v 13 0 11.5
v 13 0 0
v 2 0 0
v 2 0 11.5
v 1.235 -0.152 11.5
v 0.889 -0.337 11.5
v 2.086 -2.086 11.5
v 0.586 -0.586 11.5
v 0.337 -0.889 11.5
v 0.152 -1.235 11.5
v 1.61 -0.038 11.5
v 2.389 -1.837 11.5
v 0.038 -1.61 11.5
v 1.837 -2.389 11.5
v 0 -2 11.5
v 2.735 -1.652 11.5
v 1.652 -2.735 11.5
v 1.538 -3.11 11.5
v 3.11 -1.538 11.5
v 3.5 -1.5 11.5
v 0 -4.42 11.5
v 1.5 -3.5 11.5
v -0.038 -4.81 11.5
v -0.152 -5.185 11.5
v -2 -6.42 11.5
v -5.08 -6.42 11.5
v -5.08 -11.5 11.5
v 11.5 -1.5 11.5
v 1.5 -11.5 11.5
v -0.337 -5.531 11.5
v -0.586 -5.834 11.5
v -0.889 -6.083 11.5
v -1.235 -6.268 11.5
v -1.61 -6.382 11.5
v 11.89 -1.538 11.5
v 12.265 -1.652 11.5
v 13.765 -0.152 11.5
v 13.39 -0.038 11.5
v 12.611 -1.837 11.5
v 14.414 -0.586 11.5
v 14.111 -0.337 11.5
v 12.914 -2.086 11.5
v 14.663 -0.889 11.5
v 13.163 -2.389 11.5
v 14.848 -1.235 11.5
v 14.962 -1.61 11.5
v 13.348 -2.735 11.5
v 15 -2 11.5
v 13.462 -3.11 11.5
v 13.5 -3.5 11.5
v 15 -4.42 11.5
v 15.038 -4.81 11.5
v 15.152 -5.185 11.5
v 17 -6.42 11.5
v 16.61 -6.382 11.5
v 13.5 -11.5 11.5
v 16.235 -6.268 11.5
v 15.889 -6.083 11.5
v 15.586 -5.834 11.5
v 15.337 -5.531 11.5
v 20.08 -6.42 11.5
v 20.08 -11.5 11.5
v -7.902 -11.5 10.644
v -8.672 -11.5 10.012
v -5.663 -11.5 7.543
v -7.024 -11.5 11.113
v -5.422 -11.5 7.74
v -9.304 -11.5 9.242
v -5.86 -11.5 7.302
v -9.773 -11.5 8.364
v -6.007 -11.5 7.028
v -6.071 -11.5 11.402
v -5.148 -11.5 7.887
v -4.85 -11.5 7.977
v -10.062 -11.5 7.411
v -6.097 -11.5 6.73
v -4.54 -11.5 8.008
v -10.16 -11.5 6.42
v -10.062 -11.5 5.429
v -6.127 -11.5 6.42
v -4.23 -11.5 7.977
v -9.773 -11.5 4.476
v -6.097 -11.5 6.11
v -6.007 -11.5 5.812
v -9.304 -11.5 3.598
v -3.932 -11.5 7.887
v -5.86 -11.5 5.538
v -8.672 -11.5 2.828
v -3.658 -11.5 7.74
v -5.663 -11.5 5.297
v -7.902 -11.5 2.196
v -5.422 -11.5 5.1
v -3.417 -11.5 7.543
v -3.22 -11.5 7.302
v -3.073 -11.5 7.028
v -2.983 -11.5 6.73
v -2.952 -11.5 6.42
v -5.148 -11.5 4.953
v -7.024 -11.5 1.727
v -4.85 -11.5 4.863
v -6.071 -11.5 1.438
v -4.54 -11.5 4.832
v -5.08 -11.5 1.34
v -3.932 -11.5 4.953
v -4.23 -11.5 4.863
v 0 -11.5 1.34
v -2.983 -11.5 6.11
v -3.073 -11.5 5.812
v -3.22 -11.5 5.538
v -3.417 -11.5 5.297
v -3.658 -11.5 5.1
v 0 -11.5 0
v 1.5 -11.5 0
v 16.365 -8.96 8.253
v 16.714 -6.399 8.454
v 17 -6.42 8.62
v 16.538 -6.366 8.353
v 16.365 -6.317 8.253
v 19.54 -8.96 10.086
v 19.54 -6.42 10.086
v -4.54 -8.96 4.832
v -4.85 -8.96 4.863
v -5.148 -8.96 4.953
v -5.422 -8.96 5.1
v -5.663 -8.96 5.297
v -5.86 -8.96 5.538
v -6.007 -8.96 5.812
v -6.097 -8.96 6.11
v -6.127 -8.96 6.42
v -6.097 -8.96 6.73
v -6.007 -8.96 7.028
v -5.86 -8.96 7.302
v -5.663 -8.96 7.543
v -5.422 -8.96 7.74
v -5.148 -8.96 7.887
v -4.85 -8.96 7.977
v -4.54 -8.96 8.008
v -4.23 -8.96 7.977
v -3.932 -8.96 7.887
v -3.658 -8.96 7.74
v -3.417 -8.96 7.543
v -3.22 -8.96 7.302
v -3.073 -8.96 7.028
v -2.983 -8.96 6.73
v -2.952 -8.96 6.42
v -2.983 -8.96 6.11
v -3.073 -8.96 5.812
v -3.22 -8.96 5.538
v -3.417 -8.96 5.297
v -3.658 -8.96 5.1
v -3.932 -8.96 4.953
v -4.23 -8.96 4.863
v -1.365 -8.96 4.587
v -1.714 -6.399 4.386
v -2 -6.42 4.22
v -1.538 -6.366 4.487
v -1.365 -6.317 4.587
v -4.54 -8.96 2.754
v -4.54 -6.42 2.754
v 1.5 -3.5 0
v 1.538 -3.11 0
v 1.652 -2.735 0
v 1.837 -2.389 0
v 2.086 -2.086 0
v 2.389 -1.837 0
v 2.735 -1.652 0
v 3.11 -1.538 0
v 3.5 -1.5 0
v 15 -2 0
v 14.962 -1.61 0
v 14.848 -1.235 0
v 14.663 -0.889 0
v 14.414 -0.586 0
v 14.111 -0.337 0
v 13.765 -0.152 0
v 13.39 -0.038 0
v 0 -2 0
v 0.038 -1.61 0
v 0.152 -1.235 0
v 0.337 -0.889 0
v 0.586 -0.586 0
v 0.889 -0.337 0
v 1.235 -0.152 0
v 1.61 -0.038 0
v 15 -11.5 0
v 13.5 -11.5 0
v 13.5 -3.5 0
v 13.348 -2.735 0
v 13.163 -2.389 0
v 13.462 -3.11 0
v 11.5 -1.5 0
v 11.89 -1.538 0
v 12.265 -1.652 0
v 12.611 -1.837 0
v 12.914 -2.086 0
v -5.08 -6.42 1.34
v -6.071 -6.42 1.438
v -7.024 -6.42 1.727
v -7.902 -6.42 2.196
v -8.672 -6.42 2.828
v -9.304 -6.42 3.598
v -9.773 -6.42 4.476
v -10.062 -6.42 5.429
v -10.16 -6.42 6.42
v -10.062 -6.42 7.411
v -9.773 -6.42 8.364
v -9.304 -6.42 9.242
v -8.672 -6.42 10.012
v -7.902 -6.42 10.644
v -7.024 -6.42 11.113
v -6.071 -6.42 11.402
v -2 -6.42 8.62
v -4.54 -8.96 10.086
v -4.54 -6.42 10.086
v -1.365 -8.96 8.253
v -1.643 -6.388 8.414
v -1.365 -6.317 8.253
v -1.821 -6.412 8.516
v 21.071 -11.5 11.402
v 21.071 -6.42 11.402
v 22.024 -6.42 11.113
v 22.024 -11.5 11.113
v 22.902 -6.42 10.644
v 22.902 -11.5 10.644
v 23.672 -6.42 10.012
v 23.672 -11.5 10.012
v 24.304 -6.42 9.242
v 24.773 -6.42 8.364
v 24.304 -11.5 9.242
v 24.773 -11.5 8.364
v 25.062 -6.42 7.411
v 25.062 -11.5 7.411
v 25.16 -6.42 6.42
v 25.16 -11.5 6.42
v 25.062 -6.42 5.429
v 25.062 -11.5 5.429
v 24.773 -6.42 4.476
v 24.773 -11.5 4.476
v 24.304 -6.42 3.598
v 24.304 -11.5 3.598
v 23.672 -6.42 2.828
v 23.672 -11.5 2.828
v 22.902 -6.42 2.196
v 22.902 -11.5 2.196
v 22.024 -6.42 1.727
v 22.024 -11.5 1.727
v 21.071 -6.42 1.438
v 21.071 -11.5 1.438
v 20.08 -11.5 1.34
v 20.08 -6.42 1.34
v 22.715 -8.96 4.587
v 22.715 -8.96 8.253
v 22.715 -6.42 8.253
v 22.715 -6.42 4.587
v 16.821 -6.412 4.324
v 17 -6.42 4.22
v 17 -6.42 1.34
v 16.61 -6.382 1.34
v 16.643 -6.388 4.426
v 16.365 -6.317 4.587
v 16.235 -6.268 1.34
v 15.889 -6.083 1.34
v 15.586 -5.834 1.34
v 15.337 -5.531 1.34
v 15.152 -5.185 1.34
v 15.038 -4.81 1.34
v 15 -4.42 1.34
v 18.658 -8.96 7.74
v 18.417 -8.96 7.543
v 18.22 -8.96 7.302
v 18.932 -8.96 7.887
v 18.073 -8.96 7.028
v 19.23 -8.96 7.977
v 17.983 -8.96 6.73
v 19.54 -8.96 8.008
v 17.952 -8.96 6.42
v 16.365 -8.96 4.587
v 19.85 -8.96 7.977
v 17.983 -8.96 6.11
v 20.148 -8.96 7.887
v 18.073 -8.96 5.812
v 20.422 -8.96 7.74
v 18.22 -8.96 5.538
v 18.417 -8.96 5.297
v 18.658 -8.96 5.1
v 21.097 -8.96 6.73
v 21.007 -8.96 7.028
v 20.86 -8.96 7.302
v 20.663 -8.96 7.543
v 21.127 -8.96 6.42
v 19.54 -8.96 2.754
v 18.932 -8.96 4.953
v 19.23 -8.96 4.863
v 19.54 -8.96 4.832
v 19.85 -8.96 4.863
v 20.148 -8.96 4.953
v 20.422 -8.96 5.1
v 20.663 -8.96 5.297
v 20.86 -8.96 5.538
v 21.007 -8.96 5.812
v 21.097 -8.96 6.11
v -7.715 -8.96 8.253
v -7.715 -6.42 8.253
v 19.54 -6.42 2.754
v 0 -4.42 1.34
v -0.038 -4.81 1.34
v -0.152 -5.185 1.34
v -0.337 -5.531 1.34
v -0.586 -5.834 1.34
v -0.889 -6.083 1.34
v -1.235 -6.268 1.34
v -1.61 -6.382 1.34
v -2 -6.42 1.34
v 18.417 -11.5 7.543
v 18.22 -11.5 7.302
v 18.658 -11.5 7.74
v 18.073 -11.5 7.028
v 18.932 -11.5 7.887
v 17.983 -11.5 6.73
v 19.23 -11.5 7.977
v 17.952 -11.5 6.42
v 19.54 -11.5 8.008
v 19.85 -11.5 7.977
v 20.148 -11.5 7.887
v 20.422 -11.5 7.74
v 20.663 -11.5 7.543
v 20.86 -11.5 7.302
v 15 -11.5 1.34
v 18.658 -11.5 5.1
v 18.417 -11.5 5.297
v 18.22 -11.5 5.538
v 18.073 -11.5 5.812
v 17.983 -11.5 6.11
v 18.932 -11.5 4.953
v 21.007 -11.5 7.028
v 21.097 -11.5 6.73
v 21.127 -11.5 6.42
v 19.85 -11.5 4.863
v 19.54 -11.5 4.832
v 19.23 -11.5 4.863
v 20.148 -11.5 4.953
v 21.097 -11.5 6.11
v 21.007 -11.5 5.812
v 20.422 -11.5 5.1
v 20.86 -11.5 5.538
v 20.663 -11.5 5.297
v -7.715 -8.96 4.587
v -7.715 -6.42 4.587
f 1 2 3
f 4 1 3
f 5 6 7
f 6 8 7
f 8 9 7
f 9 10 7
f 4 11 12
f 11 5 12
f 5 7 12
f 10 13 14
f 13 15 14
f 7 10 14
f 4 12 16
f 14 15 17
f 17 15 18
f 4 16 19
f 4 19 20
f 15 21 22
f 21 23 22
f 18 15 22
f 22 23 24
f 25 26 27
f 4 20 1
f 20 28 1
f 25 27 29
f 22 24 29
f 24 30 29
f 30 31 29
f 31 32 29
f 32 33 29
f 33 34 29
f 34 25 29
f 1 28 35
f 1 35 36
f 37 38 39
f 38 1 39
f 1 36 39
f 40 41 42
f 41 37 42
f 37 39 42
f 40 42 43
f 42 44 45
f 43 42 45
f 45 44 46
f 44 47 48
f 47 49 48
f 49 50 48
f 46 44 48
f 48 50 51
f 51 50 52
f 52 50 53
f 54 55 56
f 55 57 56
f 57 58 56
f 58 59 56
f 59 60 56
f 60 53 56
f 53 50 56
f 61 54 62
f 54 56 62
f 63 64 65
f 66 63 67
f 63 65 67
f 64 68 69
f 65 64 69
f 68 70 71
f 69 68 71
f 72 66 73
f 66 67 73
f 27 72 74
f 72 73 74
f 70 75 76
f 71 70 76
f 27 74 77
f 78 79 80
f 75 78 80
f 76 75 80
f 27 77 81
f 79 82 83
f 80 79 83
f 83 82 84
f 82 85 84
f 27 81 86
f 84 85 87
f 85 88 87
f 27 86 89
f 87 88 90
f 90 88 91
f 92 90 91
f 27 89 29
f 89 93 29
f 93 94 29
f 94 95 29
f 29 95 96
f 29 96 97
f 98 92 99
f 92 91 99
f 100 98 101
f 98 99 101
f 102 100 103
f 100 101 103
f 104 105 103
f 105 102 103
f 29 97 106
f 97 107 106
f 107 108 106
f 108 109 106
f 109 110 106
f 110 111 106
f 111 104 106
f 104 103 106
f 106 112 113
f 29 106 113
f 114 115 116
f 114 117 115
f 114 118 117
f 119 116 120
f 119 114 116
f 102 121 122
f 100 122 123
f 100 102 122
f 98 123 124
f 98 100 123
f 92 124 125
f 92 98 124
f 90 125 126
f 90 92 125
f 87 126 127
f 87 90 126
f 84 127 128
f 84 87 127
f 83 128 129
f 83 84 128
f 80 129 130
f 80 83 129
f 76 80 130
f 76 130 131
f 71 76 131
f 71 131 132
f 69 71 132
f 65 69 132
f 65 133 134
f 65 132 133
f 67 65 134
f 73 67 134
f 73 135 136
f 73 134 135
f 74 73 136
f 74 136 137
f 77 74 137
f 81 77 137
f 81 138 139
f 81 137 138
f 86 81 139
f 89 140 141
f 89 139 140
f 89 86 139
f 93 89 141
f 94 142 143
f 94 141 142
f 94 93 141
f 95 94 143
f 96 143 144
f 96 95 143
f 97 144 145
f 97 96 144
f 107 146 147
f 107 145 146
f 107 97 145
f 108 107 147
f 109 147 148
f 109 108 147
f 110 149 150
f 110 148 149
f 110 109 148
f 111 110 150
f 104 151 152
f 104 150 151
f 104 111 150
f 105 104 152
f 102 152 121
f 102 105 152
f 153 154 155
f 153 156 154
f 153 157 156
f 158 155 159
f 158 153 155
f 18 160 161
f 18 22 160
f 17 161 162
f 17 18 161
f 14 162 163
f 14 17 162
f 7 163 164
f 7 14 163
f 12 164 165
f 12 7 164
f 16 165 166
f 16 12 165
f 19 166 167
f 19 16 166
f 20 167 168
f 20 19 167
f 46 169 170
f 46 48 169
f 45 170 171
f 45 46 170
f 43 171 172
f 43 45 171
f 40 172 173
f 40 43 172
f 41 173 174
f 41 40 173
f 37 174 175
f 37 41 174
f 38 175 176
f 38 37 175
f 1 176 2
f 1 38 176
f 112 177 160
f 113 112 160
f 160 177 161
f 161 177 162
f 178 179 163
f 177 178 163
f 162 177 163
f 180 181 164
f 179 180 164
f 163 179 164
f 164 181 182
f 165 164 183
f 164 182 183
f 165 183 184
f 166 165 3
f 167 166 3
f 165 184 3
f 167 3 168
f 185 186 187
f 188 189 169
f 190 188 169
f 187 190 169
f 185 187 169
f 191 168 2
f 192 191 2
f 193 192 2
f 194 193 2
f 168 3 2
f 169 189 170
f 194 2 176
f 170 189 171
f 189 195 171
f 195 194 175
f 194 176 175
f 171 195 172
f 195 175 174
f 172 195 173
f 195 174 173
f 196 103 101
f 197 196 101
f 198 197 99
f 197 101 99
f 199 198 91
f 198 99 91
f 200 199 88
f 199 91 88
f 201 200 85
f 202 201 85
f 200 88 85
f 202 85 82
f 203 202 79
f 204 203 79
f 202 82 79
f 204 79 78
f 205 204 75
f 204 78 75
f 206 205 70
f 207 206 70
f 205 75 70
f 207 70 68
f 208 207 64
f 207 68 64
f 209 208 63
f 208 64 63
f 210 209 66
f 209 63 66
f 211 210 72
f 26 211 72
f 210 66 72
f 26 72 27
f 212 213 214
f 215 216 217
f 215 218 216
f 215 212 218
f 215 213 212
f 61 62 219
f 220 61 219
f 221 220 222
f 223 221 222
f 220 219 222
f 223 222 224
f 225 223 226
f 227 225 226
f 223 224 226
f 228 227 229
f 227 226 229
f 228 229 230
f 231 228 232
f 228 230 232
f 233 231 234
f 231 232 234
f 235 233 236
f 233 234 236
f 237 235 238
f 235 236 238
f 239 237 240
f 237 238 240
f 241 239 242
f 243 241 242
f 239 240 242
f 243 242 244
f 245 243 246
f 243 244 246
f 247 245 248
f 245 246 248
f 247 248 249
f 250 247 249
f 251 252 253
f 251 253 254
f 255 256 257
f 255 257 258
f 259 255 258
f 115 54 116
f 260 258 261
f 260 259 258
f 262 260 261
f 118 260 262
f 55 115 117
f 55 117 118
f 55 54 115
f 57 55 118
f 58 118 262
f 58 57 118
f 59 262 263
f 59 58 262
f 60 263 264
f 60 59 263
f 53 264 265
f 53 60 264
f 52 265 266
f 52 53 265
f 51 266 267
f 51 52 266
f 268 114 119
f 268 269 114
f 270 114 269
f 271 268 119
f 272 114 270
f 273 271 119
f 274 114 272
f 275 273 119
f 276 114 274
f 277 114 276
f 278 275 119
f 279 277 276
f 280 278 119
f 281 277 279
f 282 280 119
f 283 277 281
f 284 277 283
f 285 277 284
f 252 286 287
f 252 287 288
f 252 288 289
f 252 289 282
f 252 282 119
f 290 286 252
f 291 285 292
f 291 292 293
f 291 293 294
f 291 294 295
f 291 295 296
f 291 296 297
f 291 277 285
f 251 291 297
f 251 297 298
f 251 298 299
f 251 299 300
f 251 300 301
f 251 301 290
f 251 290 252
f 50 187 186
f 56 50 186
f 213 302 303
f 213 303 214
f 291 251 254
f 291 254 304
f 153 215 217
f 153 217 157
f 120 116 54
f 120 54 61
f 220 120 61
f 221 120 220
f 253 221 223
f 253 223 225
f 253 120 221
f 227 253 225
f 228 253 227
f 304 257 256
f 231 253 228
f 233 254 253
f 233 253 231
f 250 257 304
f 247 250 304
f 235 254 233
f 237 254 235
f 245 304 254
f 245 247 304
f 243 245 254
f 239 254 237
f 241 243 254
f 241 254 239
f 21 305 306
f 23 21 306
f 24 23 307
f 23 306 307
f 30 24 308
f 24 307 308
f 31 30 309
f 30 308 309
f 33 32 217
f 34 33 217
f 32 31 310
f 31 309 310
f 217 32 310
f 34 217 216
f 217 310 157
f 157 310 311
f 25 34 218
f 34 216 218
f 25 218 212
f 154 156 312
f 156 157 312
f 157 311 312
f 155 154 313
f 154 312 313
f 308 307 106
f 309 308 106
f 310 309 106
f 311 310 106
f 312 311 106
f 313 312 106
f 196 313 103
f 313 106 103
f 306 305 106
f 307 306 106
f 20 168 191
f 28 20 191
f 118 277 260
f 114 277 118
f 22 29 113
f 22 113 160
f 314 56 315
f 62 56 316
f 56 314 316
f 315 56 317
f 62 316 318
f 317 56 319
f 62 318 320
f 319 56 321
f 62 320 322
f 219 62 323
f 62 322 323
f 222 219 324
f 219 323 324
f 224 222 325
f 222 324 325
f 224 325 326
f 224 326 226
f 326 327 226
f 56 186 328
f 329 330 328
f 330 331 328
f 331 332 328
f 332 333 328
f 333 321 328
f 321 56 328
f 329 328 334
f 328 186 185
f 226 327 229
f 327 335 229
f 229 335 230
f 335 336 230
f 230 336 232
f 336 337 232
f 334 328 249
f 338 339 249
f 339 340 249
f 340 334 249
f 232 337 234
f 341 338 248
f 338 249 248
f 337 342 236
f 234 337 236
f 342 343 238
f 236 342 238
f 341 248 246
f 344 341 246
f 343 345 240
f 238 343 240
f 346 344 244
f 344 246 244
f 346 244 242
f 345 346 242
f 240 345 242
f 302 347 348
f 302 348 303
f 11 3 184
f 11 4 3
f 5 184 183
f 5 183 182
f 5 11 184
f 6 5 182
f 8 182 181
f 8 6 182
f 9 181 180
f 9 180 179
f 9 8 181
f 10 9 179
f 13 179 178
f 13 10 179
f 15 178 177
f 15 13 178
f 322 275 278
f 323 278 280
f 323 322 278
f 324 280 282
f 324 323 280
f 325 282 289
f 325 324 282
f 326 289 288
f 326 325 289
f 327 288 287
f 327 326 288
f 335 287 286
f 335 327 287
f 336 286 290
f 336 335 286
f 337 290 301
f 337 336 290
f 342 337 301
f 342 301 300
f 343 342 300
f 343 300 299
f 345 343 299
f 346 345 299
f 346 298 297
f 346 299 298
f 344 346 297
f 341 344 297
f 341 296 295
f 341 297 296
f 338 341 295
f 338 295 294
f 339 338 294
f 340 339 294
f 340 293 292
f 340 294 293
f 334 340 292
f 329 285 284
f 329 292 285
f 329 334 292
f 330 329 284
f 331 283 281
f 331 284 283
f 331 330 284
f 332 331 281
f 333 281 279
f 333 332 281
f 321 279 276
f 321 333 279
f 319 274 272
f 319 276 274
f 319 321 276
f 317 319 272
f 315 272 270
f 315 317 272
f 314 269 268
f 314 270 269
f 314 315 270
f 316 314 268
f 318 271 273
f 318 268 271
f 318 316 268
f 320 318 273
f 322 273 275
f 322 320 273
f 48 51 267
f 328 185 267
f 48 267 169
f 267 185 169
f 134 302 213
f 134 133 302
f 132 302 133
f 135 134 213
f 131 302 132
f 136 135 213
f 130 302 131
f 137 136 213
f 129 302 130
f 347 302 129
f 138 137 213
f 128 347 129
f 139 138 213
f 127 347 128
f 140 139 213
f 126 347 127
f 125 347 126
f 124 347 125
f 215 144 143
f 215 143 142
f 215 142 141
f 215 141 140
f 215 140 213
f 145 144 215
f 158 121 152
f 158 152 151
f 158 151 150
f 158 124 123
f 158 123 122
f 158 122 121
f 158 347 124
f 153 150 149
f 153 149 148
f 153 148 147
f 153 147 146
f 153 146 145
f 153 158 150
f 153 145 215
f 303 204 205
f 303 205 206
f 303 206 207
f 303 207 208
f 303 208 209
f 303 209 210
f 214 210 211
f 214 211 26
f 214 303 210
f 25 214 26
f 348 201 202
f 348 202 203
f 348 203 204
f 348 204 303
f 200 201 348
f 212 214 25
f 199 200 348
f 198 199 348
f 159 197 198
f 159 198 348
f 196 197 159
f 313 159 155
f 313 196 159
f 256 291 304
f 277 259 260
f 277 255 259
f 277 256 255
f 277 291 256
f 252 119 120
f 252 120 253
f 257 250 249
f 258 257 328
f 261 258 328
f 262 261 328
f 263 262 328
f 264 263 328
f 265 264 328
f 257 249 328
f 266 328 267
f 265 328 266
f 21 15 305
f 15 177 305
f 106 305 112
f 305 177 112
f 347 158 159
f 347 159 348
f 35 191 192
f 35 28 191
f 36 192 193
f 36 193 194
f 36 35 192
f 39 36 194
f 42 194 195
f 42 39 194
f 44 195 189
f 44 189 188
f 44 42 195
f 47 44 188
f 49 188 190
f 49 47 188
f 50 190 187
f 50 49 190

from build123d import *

# Parameters (mm, degrees)
BOSS_EXTRUDE1_DEPTH     = 11.5
FILLET1_R               = 2
BOSS_EXTRUDE2_DEPTH     = 5.08
FILLET2_R               = 2
FILLET3_R               = 2
SKETCH3_R               = 1.5875
CUT_EXTRUDE1_DEPTH      = 30.958731615
CUT_EXTRUDE3_DEPTH      = 2
CUT_EXTRUDE3_DEPTH_BACK = 2.54
CUT_EXTRUDE3_START      = 5.08


with BuildPart() as part:
    # Sketch1 → Boss-Extrude1 (new body)
    with BuildSketch(Plane.XY):
        Polygon((1.5, -11.5), (1.5, -1.5), (13.5, -1.5), (13.5, -11.5), (15, -11.5), (15, 0), (0, 0), (0, -11.5), align=None)
    extrude(amount=BOSS_EXTRUDE1_DEPTH)

    # Fillet1
    fillet1_edges = [part.edges().sort_by_distance(p)[0] for p in [
        (13.5, -1.5, 5.75),
        (1.5, -1.5, 5.75),
    ]]
    fillet(fillet1_edges, radius=FILLET1_R)

    # Sketch2 → Boss-Extrude2 (add)
    with BuildSketch(Plane(origin=(0, -11.5, 0), x_dir=(1, 0, 0), z_dir=(0, 1, 0))):
        with BuildLine():
            Line((15, -1.34), (15, -11.5))
            Line((15, -11.5), (20.08, -11.5))
            ThreePointArc((20.08, -11.5), (25.16, -6.42), (20.08, -1.34))
            Line((20.08, -1.34), (15, -1.34))
        make_face()
        with BuildLine():
            Line((0, -1.34), (-5.08, -1.34))
            ThreePointArc((-5.08, -1.34), (-10.16, -6.42), (-5.08, -11.5))
            Line((-5.08, -11.5), (0, -11.5))
            Line((0, -11.5), (0, -1.34))
        make_face()
    extrude(amount=BOSS_EXTRUDE2_DEPTH)

    # Fillet2
    fillet2_edges = [part.edges().sort_by_distance(p)[0] for p in [
        (15, -6.42, 6.42),
        (0, -6.42, 6.42),
    ]]
    fillet(fillet2_edges, radius=FILLET2_R)

    # Fillet3
    fillet3_edges = [part.edges().sort_by_distance(p)[0] for p in [
        (15, 0, 5.75),
        (0, 0, 5.75),
    ]]
    fillet(fillet3_edges, radius=FILLET3_R)

    # Sketch3 → Cut-Extrude1 (cut, through all)
    with BuildSketch(Plane(origin=(0, -11.5, 0), x_dir=(1, 0, 0), z_dir=(0, 1, 0))):
        with Locations(Location((19.54, -6.42, 0), (0, 0, 270))):
            Circle(SKETCH3_R)
        with Locations(Location((-4.54, -6.42, 0), (0, 0, 90))):
            Circle(SKETCH3_R)
    extrude(amount=CUT_EXTRUDE1_DEPTH, mode=Mode.SUBTRACT)

    # Sketch6 → Cut-Extrude3 (cut, two sides: drawn at the far end of the back side and taken through both)
    with BuildSketch(Plane(origin=(0, -11.5, 0), x_dir=(1, 0, 0), z_dir=(0, 1, 0)).offset(CUT_EXTRUDE3_START - CUT_EXTRUDE3_DEPTH_BACK)):
        Polygon((-1.365, -4.586912895), (-4.54, -2.753825791), (-7.715, -4.586912895), (-7.715, -8.253087105), (-4.54, -10.086174209), (-1.365, -8.253087105), align=None)
        Polygon((22.715, -8.253087105), (22.715, -4.586912895), (19.54, -2.753825791), (16.365, -4.586912895), (16.365, -8.253087105), (19.54, -10.086174209), align=None)
    extrude(amount=CUT_EXTRUDE3_DEPTH + CUT_EXTRUDE3_DEPTH_BACK, mode=Mode.SUBTRACT)


solid = part.part
